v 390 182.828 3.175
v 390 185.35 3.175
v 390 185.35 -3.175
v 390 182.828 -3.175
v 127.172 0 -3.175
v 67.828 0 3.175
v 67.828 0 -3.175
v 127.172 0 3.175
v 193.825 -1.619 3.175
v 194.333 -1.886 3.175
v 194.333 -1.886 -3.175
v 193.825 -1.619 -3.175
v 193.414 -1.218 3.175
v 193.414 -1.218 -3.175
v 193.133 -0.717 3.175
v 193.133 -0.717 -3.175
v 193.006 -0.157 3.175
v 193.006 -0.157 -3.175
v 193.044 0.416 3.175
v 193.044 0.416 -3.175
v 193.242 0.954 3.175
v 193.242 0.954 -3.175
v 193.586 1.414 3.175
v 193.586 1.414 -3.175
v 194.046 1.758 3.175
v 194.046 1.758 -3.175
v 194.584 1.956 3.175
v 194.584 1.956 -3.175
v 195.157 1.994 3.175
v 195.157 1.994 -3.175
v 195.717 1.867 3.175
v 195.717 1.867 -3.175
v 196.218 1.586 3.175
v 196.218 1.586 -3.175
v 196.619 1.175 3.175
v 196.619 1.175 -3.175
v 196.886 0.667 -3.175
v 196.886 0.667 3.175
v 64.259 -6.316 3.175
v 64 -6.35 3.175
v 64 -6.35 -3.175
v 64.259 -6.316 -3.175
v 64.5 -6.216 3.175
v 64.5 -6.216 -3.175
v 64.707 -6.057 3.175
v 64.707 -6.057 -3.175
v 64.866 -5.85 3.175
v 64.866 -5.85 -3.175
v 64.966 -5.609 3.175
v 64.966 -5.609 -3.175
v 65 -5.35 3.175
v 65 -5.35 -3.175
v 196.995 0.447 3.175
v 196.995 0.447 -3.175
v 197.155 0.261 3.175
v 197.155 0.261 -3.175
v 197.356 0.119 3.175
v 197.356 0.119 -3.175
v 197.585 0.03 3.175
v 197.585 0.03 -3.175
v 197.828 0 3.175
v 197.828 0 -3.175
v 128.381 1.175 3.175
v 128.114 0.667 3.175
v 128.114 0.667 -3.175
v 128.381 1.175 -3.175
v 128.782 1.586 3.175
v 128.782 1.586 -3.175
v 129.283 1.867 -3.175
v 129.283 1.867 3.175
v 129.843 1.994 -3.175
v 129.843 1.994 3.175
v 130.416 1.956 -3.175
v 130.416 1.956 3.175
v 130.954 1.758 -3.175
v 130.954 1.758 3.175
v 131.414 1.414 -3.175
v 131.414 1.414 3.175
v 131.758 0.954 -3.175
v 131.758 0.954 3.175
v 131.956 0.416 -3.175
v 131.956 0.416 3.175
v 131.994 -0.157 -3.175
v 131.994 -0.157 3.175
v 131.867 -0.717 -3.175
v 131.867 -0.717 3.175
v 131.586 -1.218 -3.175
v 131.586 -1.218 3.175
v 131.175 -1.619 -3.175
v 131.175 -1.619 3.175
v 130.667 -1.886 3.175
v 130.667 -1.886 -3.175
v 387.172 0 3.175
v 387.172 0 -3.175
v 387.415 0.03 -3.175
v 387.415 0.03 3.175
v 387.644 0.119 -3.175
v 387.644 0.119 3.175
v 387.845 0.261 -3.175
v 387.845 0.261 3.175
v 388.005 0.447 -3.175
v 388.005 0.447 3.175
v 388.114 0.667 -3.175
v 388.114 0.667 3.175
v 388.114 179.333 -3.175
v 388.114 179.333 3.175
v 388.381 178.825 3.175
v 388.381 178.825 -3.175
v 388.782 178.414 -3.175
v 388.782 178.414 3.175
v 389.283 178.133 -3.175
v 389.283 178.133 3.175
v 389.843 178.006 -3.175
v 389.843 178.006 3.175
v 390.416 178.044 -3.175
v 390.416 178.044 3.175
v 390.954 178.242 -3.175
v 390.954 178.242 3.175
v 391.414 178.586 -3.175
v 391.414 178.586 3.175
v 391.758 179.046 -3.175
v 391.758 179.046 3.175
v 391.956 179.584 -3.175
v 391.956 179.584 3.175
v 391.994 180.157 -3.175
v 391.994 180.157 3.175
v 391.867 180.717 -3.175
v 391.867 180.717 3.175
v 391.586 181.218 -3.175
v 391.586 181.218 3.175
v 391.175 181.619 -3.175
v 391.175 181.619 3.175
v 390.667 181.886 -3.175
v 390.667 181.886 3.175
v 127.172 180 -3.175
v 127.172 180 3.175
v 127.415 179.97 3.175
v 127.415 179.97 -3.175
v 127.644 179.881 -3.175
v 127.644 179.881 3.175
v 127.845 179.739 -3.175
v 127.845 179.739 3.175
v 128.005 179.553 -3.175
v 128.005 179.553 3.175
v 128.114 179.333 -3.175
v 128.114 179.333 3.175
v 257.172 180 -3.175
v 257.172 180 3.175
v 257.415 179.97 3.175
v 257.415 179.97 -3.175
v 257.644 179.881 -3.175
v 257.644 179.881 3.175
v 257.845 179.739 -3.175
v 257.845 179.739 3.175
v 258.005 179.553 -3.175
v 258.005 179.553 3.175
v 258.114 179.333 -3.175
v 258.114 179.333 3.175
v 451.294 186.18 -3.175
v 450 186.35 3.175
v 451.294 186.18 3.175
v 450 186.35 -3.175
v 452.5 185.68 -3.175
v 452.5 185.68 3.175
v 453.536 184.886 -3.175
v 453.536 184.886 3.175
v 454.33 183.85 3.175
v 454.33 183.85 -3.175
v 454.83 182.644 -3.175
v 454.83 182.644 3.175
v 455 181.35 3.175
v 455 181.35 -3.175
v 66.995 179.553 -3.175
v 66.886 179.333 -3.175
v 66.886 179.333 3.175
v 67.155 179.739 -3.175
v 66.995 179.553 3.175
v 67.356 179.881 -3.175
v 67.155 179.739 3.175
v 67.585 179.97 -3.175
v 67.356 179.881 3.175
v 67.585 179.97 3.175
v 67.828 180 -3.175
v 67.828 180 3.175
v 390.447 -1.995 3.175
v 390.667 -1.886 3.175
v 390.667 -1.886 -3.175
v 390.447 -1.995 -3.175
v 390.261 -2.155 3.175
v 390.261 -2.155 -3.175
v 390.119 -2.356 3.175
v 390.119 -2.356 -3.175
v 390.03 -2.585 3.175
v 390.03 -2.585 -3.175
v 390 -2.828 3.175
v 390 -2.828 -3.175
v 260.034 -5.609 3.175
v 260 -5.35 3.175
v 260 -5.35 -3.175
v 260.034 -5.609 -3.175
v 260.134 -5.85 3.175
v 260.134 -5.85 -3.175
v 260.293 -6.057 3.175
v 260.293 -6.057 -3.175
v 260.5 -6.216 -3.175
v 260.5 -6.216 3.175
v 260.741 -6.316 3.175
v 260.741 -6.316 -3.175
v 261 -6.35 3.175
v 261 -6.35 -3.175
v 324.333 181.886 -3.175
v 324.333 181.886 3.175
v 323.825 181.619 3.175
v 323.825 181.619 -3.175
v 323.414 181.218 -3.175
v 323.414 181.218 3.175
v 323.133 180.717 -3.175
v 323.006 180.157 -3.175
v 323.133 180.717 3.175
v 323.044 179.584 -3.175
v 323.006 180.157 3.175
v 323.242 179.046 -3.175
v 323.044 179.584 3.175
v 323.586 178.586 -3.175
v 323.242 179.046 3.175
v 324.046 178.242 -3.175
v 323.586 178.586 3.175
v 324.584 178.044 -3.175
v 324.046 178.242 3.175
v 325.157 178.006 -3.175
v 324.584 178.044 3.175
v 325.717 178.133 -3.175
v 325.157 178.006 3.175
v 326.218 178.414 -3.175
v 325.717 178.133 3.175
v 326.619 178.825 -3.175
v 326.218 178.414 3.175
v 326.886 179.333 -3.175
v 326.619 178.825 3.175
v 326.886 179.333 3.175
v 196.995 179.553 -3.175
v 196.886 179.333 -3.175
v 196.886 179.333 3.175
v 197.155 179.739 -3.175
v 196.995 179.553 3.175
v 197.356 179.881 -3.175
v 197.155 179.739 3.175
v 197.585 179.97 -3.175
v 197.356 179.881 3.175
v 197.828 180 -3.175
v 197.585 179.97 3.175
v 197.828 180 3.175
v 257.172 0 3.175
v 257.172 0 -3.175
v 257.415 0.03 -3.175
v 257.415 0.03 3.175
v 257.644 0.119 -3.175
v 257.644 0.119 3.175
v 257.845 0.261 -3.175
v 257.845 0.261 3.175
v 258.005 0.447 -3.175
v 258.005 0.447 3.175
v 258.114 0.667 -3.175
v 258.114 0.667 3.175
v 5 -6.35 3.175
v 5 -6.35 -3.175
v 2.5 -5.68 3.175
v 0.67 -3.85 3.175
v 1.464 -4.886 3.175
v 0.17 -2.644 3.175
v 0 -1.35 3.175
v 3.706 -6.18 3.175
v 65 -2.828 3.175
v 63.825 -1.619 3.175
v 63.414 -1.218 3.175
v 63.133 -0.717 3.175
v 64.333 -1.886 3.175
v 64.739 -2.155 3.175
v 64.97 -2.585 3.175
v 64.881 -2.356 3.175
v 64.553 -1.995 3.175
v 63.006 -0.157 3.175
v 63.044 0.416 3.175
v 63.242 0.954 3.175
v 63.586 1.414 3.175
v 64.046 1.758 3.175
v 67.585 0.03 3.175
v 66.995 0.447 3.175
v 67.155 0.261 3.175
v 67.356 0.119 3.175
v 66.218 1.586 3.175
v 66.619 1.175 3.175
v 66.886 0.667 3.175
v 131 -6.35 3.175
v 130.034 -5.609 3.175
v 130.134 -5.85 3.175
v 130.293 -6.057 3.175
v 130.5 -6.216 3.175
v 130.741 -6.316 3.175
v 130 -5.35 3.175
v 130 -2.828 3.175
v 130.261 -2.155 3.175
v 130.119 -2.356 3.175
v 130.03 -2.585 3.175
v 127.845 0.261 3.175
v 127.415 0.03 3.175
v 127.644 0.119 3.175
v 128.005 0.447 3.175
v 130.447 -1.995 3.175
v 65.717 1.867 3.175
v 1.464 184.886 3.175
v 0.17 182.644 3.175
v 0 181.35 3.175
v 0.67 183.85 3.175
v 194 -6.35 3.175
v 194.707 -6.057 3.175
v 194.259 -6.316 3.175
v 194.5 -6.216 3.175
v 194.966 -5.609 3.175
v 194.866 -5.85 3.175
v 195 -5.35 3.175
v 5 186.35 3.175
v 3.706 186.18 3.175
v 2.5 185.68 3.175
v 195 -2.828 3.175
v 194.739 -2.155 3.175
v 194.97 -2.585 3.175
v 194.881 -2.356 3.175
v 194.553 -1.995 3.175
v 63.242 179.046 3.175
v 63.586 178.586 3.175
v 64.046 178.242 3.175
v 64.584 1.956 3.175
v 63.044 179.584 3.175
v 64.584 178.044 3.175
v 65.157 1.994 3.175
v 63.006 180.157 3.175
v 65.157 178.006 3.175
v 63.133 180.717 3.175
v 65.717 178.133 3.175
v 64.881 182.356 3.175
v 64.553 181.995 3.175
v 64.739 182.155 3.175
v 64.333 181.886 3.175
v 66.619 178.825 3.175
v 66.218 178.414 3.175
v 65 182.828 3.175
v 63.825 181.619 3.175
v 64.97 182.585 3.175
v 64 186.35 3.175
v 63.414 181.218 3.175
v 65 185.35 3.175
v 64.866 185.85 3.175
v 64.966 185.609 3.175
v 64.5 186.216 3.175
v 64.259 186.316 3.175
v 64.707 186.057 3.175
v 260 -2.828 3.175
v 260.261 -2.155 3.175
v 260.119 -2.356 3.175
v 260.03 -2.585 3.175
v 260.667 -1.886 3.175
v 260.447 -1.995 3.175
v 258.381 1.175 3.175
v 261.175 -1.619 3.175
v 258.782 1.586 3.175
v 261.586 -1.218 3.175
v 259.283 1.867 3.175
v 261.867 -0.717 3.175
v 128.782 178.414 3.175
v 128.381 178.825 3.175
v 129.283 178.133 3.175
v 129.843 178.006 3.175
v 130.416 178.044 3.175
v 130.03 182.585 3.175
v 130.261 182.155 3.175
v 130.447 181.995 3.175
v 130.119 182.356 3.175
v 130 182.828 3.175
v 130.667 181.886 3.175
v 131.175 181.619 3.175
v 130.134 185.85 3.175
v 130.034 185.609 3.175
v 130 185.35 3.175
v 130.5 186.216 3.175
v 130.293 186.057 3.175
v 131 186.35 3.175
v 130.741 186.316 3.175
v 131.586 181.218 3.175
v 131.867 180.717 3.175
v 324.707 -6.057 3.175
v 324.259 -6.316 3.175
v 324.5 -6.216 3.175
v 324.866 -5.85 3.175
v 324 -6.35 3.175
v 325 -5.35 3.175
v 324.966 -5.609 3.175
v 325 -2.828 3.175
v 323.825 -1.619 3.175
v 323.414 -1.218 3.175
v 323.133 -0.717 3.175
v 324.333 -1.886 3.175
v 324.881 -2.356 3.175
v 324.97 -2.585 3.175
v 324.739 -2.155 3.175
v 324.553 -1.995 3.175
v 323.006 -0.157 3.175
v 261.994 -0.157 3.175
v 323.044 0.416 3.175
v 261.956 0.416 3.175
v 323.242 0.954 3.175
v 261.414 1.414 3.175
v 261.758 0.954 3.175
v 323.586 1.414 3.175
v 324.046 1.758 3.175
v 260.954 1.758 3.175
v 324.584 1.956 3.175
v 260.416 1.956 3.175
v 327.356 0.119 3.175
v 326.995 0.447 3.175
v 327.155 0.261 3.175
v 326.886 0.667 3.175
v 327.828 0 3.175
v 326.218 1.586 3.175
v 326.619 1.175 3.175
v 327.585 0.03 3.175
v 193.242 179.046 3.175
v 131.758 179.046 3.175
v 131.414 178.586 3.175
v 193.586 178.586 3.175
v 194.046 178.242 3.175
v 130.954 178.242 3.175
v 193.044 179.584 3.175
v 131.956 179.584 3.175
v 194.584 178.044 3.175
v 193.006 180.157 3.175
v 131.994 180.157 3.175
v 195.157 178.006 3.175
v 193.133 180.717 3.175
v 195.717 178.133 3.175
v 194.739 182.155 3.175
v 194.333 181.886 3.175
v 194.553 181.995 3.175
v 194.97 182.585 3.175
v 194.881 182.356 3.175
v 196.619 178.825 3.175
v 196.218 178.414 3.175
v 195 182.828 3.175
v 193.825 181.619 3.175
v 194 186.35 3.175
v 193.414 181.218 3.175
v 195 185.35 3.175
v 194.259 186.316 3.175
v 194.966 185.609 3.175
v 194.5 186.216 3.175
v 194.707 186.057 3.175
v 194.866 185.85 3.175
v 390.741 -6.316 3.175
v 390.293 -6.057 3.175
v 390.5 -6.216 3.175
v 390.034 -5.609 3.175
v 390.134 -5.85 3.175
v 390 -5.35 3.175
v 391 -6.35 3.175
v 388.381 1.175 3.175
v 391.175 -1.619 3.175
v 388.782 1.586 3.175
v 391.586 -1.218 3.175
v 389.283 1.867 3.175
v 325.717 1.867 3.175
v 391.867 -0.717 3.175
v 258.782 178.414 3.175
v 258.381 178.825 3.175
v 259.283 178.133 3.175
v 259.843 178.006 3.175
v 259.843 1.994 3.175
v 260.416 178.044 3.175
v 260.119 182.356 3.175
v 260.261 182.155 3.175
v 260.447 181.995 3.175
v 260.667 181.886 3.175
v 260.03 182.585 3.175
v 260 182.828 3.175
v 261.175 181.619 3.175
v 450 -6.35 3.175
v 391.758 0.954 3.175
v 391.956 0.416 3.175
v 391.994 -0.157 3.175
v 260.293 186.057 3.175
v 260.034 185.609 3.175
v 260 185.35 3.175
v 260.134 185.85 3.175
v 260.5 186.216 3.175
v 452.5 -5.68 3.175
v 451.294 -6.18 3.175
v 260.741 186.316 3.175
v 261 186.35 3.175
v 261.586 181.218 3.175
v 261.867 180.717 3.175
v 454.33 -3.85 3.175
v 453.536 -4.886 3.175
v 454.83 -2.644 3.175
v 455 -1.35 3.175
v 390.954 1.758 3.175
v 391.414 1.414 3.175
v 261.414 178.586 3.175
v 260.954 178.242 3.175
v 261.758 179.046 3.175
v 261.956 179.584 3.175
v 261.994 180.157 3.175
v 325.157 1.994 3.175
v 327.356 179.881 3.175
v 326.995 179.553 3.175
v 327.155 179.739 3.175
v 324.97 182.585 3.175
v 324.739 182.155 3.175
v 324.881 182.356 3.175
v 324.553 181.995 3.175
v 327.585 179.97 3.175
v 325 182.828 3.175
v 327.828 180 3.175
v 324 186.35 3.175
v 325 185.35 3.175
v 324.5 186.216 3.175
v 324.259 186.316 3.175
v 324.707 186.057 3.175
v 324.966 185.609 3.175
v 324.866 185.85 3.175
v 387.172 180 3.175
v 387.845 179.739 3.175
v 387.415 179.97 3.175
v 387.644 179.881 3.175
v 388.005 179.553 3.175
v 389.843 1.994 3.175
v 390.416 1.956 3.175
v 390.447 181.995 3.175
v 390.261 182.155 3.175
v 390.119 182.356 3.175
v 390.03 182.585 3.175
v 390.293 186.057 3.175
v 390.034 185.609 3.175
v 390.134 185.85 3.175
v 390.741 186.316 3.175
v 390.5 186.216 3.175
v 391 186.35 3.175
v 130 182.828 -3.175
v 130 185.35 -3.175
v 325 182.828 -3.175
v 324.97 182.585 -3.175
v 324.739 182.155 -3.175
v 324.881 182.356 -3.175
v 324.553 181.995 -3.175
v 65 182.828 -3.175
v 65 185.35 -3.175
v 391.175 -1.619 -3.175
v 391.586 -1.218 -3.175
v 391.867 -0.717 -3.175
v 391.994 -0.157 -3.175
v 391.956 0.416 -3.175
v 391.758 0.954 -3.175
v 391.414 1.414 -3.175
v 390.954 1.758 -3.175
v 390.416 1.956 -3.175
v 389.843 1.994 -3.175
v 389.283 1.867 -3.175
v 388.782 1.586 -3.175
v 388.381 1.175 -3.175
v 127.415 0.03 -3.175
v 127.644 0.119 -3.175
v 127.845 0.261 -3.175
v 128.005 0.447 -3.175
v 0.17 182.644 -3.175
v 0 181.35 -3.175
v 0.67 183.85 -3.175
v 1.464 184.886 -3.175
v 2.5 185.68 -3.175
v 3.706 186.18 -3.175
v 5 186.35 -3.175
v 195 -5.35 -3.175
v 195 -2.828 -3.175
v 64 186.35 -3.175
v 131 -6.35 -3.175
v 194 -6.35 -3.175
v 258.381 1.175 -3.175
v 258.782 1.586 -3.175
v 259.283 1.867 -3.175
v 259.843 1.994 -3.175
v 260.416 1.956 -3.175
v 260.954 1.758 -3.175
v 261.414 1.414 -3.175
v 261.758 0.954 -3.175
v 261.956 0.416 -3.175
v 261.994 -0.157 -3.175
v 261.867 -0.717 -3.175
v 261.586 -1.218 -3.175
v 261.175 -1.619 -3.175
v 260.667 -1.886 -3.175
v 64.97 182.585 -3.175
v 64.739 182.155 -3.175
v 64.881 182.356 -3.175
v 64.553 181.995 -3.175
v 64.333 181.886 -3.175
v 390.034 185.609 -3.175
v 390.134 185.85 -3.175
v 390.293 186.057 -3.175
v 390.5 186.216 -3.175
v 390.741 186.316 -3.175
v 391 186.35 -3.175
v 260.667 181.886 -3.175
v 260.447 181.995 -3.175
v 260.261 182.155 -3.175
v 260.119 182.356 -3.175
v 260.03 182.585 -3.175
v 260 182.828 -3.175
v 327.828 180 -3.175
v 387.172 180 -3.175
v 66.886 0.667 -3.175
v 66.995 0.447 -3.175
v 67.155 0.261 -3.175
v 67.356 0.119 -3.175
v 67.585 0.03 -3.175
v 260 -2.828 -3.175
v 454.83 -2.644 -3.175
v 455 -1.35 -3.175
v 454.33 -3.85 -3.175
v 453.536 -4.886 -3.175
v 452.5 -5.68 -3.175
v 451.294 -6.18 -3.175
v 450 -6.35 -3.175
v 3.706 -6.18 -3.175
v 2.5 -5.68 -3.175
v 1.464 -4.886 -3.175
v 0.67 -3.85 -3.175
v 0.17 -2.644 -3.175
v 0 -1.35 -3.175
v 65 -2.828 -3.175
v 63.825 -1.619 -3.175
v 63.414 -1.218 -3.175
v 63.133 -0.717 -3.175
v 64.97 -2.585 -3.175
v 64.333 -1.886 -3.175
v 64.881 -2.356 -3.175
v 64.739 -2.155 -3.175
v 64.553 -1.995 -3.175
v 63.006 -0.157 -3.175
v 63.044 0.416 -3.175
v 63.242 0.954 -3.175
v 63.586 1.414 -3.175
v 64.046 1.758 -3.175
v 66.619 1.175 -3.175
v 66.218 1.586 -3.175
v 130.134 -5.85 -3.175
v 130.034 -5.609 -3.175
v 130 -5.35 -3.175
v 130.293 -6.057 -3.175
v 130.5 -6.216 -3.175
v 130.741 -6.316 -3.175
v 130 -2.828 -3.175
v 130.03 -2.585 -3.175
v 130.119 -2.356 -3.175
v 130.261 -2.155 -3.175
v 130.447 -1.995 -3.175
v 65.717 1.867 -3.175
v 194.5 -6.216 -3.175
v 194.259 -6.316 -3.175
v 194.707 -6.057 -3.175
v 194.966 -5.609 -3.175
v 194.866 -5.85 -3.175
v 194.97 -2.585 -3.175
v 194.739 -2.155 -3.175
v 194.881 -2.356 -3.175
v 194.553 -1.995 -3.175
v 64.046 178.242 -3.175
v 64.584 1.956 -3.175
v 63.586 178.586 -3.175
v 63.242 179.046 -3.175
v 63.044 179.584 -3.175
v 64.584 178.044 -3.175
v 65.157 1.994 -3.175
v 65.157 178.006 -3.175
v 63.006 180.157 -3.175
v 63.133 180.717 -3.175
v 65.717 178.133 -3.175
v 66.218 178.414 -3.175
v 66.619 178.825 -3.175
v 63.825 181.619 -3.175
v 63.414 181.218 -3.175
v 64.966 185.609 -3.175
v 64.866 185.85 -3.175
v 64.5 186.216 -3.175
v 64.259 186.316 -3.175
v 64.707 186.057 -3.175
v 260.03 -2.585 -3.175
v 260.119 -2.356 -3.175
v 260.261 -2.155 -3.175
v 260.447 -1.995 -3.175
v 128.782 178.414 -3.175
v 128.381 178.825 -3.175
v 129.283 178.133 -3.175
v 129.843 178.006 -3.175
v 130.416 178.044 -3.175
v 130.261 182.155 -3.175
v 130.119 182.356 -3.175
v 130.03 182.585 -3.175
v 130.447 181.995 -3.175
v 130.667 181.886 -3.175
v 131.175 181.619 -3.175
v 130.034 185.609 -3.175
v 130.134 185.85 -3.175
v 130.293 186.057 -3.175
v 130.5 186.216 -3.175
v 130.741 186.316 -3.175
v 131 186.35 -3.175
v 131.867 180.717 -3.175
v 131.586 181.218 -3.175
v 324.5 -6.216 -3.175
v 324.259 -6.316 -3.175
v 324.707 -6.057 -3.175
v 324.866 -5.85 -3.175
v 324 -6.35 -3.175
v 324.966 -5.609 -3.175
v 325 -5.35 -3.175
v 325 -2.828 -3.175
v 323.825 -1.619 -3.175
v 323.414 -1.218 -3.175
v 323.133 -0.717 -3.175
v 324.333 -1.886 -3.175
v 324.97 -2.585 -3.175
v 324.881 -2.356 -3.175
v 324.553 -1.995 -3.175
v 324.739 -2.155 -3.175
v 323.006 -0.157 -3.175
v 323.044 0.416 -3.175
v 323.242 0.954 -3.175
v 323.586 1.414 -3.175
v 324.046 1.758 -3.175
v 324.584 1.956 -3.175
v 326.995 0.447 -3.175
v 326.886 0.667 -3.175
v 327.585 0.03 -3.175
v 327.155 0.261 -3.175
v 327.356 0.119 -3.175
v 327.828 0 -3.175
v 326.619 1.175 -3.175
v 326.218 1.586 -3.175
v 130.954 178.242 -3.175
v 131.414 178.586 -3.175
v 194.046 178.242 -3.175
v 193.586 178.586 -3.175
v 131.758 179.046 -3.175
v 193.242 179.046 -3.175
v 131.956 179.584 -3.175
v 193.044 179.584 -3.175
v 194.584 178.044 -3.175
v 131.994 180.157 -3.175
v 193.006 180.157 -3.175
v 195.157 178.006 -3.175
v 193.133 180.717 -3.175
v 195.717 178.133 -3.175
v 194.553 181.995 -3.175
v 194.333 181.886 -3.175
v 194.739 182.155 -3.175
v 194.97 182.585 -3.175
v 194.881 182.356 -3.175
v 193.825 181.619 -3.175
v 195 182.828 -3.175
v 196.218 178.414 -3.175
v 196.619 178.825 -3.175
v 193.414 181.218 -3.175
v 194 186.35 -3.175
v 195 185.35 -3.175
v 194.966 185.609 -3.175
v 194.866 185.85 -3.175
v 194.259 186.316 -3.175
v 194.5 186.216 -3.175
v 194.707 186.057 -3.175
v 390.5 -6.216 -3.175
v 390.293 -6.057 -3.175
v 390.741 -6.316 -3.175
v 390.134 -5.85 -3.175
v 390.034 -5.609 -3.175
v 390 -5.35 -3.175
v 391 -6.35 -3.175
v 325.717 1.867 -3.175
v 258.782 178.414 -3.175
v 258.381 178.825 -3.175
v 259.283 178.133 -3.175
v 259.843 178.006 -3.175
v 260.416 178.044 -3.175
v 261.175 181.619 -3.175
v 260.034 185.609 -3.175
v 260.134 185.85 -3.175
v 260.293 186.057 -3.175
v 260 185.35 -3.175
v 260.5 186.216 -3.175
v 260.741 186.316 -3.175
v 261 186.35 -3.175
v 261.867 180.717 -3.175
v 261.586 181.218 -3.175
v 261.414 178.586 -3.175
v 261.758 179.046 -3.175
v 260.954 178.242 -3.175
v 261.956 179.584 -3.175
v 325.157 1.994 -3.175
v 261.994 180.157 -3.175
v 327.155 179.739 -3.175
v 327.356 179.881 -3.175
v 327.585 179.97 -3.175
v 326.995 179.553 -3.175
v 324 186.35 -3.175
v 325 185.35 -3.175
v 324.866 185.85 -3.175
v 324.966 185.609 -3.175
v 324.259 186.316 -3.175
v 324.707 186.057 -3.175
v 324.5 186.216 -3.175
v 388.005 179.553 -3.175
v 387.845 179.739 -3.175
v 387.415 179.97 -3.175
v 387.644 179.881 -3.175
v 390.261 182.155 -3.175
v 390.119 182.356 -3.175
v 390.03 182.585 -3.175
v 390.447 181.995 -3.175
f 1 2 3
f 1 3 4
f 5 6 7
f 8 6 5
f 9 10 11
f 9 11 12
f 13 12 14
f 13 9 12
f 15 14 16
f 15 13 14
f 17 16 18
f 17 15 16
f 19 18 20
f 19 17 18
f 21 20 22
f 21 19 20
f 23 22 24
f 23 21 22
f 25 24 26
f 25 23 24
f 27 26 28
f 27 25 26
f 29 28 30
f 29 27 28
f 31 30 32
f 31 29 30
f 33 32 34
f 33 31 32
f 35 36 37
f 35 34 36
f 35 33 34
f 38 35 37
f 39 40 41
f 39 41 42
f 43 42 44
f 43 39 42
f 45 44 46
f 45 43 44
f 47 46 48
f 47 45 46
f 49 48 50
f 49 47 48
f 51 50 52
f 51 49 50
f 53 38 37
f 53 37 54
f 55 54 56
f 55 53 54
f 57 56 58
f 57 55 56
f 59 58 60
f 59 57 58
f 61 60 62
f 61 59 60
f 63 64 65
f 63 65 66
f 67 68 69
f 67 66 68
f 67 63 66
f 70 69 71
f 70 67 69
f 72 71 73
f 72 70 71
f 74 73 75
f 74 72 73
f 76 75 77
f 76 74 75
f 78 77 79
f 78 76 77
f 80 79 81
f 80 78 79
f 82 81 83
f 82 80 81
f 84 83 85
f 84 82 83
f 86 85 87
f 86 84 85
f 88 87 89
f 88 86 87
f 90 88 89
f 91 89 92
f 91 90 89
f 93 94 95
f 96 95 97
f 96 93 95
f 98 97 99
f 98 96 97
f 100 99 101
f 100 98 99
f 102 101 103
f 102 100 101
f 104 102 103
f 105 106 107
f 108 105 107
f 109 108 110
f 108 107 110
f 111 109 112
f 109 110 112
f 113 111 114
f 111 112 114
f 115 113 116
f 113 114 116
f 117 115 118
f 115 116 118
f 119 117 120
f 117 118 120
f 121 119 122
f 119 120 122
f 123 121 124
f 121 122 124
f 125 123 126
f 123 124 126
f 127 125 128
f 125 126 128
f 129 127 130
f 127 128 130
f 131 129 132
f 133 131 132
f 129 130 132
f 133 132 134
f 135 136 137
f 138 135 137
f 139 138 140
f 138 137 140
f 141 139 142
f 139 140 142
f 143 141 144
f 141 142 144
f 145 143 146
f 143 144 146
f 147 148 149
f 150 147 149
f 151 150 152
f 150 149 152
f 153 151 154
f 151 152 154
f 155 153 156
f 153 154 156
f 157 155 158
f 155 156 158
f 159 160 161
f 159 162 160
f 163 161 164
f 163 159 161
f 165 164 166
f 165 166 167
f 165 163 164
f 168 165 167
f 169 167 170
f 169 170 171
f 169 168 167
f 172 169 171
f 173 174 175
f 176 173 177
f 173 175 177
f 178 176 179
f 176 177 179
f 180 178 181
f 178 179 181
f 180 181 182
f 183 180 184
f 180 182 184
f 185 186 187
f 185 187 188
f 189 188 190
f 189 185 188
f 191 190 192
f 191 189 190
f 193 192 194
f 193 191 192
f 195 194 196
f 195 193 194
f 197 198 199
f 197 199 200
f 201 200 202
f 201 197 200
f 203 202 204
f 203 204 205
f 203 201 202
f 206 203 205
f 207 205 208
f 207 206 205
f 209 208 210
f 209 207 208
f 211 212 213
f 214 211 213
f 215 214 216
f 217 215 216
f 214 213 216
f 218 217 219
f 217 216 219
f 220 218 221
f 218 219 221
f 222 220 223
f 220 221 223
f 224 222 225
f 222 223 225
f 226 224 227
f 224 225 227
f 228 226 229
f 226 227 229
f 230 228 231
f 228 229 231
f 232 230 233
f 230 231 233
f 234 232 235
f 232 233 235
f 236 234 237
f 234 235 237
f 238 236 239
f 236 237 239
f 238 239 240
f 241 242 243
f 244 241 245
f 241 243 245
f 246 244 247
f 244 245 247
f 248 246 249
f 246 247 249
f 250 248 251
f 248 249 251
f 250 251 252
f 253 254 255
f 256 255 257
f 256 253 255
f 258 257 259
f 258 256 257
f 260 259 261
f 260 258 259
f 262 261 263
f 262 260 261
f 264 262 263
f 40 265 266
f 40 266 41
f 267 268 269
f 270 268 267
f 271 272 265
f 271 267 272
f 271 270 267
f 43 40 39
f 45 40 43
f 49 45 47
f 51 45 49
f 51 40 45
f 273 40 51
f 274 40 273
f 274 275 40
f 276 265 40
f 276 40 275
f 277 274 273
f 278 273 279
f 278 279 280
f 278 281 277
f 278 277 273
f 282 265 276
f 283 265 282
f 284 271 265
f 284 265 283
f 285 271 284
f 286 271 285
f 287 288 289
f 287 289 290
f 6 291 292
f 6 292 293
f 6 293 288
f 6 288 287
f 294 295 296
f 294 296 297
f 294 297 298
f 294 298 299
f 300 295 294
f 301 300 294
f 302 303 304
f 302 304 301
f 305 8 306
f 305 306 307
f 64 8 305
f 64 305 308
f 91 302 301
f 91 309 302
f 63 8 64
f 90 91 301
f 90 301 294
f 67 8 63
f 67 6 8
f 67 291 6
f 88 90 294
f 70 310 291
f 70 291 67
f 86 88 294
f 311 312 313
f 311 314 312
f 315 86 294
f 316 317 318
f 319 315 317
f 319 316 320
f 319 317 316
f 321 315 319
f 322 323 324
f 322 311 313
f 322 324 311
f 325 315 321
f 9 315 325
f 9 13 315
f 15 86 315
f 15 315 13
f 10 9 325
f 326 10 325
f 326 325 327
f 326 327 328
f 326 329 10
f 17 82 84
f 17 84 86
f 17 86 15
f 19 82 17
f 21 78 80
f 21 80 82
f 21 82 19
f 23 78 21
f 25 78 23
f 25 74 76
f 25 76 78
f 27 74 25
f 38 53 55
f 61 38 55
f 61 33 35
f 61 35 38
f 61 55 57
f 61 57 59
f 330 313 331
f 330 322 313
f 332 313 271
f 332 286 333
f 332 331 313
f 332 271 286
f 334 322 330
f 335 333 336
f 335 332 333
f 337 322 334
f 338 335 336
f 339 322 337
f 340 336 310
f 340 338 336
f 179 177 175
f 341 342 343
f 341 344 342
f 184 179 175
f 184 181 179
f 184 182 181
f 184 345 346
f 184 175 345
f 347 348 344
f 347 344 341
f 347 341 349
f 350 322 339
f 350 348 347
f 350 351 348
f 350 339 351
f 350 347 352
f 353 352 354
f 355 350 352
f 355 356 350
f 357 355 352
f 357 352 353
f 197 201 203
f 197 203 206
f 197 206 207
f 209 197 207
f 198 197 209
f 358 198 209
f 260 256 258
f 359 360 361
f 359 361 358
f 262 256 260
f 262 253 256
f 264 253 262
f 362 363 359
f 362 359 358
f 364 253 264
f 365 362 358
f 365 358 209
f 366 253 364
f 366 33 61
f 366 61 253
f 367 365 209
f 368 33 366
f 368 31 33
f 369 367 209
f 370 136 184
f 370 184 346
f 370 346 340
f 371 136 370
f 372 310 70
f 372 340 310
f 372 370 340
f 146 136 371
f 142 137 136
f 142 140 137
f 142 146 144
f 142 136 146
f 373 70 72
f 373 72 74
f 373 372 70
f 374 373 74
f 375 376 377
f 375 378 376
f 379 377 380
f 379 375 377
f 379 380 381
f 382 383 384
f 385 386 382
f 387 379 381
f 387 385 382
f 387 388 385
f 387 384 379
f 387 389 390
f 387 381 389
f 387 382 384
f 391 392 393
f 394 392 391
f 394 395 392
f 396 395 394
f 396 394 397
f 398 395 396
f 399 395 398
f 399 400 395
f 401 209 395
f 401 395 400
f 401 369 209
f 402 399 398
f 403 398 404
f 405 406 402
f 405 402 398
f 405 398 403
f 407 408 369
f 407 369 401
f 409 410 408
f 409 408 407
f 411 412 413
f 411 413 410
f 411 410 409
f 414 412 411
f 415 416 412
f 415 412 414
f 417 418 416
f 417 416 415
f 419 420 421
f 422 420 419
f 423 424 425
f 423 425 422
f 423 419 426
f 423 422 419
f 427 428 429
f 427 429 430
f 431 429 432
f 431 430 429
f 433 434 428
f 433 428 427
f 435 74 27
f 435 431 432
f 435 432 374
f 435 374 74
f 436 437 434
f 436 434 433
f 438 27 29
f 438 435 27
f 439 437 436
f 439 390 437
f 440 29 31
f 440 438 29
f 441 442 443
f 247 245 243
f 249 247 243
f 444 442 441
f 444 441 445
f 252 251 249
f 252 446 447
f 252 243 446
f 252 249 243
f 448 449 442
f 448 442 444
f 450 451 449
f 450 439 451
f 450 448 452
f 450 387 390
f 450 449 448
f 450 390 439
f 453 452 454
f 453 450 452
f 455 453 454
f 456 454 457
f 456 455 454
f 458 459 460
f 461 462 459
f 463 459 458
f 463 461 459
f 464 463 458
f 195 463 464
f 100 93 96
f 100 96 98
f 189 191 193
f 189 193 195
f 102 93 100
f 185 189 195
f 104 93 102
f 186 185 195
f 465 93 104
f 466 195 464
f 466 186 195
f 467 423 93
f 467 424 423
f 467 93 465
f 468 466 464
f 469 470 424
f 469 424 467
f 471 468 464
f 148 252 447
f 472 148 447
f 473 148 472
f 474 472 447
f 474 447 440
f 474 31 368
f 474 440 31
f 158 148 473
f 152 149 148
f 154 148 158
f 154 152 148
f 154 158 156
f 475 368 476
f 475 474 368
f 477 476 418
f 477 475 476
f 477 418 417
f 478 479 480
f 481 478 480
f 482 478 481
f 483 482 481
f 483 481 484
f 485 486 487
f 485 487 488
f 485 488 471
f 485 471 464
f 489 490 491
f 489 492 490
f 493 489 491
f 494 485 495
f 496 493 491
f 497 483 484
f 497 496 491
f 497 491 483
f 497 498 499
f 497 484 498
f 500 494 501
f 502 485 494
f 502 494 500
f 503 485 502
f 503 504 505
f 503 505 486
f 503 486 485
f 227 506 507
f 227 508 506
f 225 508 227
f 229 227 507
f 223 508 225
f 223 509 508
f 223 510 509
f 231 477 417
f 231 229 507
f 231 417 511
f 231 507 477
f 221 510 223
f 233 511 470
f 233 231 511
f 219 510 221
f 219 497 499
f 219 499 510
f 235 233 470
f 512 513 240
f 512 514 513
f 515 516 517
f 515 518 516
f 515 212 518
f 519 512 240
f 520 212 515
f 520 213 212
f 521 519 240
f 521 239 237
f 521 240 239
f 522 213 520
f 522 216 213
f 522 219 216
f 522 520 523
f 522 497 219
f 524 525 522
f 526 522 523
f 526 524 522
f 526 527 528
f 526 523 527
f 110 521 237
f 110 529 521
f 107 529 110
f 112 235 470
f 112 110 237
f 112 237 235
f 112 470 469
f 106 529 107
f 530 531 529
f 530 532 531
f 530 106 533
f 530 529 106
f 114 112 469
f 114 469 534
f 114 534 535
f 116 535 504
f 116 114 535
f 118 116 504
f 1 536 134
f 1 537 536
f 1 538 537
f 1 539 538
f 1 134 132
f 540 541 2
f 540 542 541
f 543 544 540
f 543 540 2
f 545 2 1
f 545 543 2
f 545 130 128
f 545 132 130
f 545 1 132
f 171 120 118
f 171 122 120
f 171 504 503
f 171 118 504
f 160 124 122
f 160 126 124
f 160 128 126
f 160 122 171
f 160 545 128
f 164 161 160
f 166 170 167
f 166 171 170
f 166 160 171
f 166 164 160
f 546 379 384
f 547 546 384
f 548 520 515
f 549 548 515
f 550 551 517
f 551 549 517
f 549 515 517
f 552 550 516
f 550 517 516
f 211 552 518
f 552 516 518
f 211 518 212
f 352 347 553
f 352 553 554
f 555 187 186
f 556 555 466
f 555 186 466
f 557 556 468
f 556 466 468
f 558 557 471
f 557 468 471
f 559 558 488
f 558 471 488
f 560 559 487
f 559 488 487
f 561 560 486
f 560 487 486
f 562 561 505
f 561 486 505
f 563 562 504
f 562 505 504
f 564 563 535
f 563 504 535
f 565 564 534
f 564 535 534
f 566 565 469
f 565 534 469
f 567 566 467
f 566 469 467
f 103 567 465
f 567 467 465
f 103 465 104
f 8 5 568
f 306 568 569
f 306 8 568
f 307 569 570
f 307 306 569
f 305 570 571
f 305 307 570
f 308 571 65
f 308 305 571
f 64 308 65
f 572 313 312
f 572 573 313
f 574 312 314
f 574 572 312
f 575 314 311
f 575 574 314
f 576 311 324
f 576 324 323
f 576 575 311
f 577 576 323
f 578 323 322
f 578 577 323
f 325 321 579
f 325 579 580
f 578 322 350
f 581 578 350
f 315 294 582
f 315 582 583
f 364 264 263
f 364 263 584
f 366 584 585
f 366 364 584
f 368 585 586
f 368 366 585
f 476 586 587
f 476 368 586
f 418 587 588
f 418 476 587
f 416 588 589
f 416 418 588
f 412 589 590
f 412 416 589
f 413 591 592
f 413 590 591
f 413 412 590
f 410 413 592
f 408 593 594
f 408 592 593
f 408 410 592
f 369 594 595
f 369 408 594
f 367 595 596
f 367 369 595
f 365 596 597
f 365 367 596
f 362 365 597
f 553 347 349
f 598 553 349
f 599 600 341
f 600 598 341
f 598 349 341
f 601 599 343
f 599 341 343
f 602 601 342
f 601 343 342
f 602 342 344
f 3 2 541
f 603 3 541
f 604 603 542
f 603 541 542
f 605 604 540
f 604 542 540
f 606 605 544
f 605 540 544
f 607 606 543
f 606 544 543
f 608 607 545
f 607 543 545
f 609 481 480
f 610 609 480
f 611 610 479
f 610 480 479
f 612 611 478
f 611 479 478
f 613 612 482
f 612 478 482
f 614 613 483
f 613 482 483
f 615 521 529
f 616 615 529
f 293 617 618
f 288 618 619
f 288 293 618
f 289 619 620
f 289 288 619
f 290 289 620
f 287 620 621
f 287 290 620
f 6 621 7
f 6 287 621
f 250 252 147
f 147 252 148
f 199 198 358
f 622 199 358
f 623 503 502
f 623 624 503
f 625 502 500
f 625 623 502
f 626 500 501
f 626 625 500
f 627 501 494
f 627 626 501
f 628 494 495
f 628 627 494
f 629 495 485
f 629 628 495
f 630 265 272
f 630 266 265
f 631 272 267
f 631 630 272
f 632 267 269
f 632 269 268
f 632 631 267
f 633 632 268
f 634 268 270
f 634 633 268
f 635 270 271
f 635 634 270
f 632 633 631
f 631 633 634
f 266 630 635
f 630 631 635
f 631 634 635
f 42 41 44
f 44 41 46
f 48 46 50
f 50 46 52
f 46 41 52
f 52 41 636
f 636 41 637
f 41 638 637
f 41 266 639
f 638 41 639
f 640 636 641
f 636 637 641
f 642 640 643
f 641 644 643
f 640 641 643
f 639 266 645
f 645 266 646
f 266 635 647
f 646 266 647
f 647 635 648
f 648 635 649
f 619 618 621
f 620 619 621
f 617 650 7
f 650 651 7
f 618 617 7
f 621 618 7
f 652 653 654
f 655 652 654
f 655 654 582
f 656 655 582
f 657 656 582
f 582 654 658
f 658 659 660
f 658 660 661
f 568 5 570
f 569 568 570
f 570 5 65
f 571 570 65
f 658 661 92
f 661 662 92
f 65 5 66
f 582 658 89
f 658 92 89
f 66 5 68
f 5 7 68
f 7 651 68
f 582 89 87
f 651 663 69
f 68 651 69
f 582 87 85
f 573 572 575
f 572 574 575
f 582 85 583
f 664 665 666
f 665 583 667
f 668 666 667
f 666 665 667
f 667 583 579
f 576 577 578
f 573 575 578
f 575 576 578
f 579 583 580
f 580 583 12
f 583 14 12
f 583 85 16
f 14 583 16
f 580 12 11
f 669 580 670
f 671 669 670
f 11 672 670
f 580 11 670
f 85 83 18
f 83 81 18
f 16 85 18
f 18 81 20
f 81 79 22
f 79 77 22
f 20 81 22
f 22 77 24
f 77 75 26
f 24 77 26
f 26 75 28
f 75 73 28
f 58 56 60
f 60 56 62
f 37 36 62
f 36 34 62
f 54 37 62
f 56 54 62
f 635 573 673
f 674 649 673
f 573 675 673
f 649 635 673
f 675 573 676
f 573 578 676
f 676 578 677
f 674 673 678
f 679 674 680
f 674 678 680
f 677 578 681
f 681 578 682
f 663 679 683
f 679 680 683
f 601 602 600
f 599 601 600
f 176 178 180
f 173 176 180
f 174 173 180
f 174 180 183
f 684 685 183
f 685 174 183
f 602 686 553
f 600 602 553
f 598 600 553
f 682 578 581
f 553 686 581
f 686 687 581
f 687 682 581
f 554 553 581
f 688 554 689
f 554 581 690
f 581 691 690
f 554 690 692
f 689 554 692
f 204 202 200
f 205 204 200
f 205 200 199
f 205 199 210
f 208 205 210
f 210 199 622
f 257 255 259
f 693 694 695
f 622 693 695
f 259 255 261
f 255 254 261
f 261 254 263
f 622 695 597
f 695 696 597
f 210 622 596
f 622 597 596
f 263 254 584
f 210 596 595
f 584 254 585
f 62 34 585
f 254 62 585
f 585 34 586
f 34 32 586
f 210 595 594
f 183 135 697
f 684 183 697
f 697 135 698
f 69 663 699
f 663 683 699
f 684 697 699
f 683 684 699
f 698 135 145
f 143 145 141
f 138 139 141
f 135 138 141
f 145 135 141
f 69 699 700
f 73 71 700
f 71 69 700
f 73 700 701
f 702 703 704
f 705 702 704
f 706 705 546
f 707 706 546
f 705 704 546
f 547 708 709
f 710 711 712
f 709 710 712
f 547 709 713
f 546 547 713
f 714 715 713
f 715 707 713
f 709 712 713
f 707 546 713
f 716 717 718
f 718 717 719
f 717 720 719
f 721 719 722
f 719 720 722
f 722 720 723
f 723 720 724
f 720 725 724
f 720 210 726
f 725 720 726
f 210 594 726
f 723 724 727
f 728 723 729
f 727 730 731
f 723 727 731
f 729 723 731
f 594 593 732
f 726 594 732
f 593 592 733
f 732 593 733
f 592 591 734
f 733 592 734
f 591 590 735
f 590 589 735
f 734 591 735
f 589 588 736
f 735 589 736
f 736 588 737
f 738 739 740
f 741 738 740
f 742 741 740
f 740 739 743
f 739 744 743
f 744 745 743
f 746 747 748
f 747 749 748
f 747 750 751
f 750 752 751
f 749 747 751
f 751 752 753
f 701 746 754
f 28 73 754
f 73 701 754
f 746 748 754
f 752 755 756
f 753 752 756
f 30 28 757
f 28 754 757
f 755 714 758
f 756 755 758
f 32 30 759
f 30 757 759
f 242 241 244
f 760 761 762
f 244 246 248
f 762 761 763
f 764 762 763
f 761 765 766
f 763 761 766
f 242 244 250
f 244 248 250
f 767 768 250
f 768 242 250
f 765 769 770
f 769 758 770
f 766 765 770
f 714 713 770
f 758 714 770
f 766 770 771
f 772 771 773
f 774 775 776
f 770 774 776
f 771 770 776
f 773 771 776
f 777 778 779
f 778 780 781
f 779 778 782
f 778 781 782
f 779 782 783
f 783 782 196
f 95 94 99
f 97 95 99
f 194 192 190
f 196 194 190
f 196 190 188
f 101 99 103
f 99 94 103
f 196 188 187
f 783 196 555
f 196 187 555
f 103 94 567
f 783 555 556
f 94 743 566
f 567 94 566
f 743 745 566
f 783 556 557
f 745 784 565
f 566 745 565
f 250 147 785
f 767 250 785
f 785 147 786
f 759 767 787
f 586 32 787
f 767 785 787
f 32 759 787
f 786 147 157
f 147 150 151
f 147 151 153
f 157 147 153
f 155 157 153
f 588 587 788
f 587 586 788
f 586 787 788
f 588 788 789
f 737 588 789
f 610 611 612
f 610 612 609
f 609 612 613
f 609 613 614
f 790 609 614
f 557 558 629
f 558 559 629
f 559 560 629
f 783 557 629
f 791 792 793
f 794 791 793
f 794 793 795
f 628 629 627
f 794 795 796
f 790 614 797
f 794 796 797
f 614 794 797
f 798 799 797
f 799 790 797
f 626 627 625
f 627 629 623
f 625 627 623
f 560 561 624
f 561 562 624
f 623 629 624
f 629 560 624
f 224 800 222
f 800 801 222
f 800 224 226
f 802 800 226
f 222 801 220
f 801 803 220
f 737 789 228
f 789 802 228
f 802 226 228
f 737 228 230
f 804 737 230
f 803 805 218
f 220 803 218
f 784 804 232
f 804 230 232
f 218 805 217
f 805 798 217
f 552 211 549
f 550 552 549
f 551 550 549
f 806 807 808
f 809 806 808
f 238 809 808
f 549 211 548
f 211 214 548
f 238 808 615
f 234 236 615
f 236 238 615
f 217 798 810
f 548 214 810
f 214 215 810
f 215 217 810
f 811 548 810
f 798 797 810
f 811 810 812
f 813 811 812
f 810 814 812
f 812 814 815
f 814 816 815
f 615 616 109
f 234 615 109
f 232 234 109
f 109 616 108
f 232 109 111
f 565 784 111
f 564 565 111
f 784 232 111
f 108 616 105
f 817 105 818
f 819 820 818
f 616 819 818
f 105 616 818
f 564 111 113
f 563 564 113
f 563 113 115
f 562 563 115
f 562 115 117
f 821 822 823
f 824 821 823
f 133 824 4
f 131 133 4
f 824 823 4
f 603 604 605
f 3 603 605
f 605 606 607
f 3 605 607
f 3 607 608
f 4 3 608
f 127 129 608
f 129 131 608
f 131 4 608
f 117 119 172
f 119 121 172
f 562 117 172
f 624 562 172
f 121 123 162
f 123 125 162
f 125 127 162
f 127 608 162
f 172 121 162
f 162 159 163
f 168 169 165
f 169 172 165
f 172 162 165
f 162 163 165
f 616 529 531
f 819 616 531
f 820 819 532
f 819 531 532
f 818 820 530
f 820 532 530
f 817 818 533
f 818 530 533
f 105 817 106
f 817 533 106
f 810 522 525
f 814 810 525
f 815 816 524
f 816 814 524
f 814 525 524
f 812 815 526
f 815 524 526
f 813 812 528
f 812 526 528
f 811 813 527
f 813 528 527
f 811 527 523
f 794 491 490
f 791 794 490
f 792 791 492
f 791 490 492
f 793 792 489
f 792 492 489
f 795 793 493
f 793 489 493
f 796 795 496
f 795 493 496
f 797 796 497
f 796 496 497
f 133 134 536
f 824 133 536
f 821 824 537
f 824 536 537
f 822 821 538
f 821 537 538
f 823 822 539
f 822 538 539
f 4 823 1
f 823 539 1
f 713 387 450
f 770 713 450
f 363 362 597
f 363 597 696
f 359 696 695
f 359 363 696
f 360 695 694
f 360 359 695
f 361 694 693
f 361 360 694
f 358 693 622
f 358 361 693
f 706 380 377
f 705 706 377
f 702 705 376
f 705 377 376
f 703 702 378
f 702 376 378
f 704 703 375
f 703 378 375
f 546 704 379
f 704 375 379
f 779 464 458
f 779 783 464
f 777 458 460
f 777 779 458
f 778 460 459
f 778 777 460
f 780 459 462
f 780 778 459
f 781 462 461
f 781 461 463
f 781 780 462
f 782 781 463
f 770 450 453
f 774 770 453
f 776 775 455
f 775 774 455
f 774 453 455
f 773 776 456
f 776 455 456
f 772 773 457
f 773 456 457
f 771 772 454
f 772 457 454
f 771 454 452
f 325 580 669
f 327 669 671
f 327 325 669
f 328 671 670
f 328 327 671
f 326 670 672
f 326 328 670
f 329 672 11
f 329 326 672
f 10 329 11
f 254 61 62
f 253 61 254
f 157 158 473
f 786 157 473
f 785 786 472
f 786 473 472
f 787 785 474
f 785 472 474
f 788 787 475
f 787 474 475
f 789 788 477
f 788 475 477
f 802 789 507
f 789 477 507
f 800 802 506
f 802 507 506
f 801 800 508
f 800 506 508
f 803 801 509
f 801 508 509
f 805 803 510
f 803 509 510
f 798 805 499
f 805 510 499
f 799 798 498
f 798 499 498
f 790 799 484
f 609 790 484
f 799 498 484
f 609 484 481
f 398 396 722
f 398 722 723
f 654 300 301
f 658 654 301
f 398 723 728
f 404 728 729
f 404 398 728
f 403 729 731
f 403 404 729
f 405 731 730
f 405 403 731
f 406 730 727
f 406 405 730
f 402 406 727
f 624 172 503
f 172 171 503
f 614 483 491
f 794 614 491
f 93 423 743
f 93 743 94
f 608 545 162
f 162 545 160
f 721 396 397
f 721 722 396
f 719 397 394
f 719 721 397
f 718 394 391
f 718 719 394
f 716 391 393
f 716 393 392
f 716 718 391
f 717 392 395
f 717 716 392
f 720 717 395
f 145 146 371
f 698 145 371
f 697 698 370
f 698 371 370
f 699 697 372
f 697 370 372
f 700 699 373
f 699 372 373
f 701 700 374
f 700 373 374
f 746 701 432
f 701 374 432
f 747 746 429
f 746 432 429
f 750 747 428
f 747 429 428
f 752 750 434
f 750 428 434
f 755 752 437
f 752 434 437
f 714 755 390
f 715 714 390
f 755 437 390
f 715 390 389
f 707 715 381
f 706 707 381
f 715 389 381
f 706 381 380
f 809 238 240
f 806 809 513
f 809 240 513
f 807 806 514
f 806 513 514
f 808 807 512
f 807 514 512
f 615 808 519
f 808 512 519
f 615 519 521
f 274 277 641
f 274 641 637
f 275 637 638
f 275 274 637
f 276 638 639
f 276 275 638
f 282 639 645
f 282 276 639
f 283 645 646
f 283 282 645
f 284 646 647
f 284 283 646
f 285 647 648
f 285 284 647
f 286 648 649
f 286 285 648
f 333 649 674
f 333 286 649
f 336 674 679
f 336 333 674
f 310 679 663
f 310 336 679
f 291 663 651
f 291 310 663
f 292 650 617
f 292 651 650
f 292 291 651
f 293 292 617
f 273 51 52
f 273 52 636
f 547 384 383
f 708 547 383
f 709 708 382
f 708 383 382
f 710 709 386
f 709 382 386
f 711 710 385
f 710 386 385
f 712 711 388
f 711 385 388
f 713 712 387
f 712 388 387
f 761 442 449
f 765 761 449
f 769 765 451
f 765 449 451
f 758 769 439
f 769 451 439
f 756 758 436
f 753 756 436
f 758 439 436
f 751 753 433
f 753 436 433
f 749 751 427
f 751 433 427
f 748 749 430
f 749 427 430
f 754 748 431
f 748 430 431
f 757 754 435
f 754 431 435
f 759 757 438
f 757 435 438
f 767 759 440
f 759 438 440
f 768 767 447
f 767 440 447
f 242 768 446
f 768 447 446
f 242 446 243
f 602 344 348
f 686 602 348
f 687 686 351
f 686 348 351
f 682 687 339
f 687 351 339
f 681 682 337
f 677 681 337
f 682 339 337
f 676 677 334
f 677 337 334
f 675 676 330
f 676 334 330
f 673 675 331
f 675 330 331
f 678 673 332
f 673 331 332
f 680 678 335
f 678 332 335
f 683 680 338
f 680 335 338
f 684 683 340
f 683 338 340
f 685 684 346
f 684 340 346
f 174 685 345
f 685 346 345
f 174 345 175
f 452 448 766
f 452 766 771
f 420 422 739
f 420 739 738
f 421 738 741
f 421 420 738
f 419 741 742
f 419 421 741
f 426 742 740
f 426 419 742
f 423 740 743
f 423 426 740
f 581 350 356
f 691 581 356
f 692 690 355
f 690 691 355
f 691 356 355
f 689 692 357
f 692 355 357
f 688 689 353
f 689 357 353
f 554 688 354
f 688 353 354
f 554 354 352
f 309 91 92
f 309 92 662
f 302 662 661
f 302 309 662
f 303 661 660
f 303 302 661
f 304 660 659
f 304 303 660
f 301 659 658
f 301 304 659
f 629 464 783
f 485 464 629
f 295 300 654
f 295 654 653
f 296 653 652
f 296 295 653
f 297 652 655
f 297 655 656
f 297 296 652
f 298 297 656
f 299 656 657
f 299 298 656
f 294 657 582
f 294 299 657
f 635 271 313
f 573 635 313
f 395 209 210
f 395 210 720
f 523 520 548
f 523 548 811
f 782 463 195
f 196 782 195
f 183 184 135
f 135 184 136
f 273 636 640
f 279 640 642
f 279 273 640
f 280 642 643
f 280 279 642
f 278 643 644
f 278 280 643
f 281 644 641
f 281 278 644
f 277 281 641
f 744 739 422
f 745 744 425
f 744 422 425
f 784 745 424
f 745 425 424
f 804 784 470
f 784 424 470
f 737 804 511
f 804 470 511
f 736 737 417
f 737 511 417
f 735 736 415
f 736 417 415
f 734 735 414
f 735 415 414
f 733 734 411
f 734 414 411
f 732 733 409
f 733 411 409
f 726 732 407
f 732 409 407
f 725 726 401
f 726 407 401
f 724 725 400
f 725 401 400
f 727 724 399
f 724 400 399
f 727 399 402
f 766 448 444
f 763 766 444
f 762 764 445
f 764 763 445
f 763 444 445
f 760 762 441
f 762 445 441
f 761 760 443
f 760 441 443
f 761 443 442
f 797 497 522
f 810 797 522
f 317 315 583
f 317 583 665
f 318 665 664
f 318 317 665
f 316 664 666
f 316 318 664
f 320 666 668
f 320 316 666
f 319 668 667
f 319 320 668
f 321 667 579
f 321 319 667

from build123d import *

# Parameters (mm, degrees)
SKETCH1_W               = 455
SKETCH1_H               = 180
BOSS_EXTRUDE1_DEPTH     = 3.175
SKETCH2_W               = 65
SKETCH2_H               = 6.35
BOSS_EXTRUDE2_DEPTH     = 6.35
LPATTERN1_COUNT         = 4
LPATTERN1_PITCH         = 130
MIRROR1_COPY_1_SKETCH_W = 65
MIRROR1_COPY_1_SKETCH_H = 6.35
MIRROR1_COPY_1_DEPTH    = 6.35
MIRROR1_COPY_2_SKETCH_W = 65
MIRROR1_COPY_2_SKETCH_H = 6.35
MIRROR1_COPY_2_DEPTH    = 6.35
MIRROR1_COPY_3_SKETCH_W = 65
MIRROR1_COPY_3_SKETCH_H = 6.35
MIRROR1_COPY_3_DEPTH    = 6.35
SKETCH3_R               = 2
CUT_EXTRUDE1_DEPTH      = 7.35
FILLET2_R               = 1
CUT_EXTRUDE2_DEPTH      = 7.35
LPATTERN2_COUNT         = 3
LPATTERN2_PITCH         = 130
MIRROR2_COPY_1_DEPTH    = 7.35
MIRROR2_COPY_2_DEPTH    = 7.35
FILLET4_R               = 5


with BuildPart() as part:
    # Sketch1 → Boss-Extrude1 (new body, symmetric)
    with BuildSketch(Plane.XY):
        with Locations((227.5, 90)):
            Rectangle(SKETCH1_W, SKETCH1_H)
    extrude(amount=BOSS_EXTRUDE1_DEPTH, both=True)

    # Sketch2 → Boss-Extrude2 (add)
    with BuildSketch(Plane.XY.offset(3.175)):
        with Locations((422.5, -3.175)):
            Rectangle(SKETCH2_W, SKETCH2_H)
    boss_extrude2 = extrude(amount=-BOSS_EXTRUDE2_DEPTH)

    # LPattern1: Boss-Extrude2 ×4
    with Locations(*[(-i * LPATTERN1_PITCH, 0, 0) for i in range(1, LPATTERN1_COUNT)]):
        add(boss_extrude2)

    # Mirror1: Boss-Extrude2 across plane
    add(boss_extrude2.mirror(Plane(origin=(0, 90, 0), x_dir=(0, 0, 1), z_dir=(0, -1, 0))))

    # Mirror1 copy 1 sketch → Mirror1 copy 1 (add)
    with BuildSketch(Plane(origin=(-130, 180, 3.175), x_dir=(1, 0, 0), z_dir=(0, 0, 1))):
        with Locations((422.5, 3.175)):
            Rectangle(MIRROR1_COPY_1_SKETCH_W, MIRROR1_COPY_1_SKETCH_H)
    extrude(amount=-MIRROR1_COPY_1_DEPTH)

    # Mirror1 copy 2 sketch → Mirror1 copy 2 (add)
    with BuildSketch(Plane(origin=(-260, 180, 3.175), x_dir=(1, 0, 0), z_dir=(0, 0, 1))):
        with Locations((422.5, 3.175)):
            Rectangle(MIRROR1_COPY_2_SKETCH_W, MIRROR1_COPY_2_SKETCH_H)
    extrude(amount=-MIRROR1_COPY_2_DEPTH)

    # Mirror1 copy 3 sketch → Mirror1 copy 3 (add)
    with BuildSketch(Plane(origin=(-390, 180, 3.175), x_dir=(1, 0, 0), z_dir=(0, 0, 1))):
        with Locations((422.5, 3.175)):
            Rectangle(MIRROR1_COPY_3_SKETCH_W, MIRROR1_COPY_3_SKETCH_H)
    extrude(amount=-MIRROR1_COPY_3_DEPTH)

    # Sketch3 → Cut-Extrude1 (cut, through all)
    with BuildSketch(Plane.XY.offset(3.175)):
        with Locations((325, 0)):
            Circle(SKETCH3_R)
        with Locations((390, 0)):
            Circle(SKETCH3_R)
    extrude(amount=-CUT_EXTRUDE1_DEPTH, mode=Mode.SUBTRACT)

    # Fillet2
    fillet2_edges = [part.edges().sort_by_distance(p)[0] for p in [
        (390, -6.35, 0),
        (325, -6.35, 0),
    ]]
    fillet(fillet2_edges, radius=FILLET2_R)

    # Sketch4 → Cut-Extrude2 (cut, through all)
    with BuildSketch(Plane.XY.offset(3.175)):
        with BuildLine():
            Line((390, -2.828427125), (390, -5.35))
            ThreePointArc((390, -5.35), (390.292893219, -6.057106781), (391, -6.35))
            Line((391, -6.35), (324, -6.35))
            ThreePointArc((324, -6.35), (324.707106781, -6.057106781), (325, -5.35))
            Line((325, -5.35), (325, -2.828427125))
            ThreePointArc((325, -2.828427125), (324.816496581, -2.251076856), (324.333333333, -1.885618083))
            ThreePointArc((324.333333333, -1.885618083), (323.585786438, 1.414213562), (326.885618083, 0.666666667))
            ThreePointArc((326.885618083, 0.666666667), (327.251076856, 0.183503419), (327.828427125, 0))
            Line((327.828427125, 0), (387.171572875, 0))
            ThreePointArc((387.171572875, 0), (387.748923144, 0.183503419), (388.114381917, 0.666666667))
            ThreePointArc((388.114381917, 0.666666667), (391.414213562, 1.414213562), (390.666666667, -1.885618083))
            ThreePointArc((390.666666667, -1.885618083), (390.183503419, -2.251076856), (390, -2.828427125))
        make_face()
    cut_extrude2 = extrude(amount=-CUT_EXTRUDE2_DEPTH, mode=Mode.SUBTRACT)

    # LPattern2: Cut-Extrude2 ×3
    with Locations(*[(-i * LPATTERN2_PITCH, 0, 0) for i in range(1, LPATTERN2_COUNT)]):
        add(cut_extrude2, mode=Mode.SUBTRACT)

    # Mirror2: Cut-Extrude2 across plane
    add(cut_extrude2.mirror(Plane(origin=(0, 90, 0), x_dir=(0, 0, 1), z_dir=(0, -1, 0))), mode=Mode.SUBTRACT)

    # Mirror2 copy 1 sketch → Mirror2 copy 1 (cut, through all)
    with BuildSketch(Plane(origin=(-130, 180, 3.175), x_dir=(1, 0, 0), z_dir=(0, 0, 1))):
        with BuildLine():
            Line((390, 2.828427125), (390, 5.35))
            ThreePointArc((390, 5.35), (390.292893219, 6.057106781), (391, 6.35))
            Line((391, 6.35), (324, 6.35))
            ThreePointArc((324, 6.35), (324.707106781, 6.057106781), (325, 5.35))
            Line((325, 5.35), (325, 2.828427125))
            ThreePointArc((325, 2.828427125), (324.816496581, 2.251076856), (324.333333333, 1.885618083))
            ThreePointArc((324.333333333, 1.885618083), (323.585786438, -1.414213562), (326.885618083, -0.666666667))
            ThreePointArc((326.885618083, -0.666666667), (327.251076856, -0.183503419), (327.828427125, 0))
            Line((327.828427125, 0), (387.171572875, 0))
            ThreePointArc((387.171572875, 0), (387.748923144, -0.183503419), (388.114381917, -0.666666667))
            ThreePointArc((388.114381917, -0.666666667), (391.414213562, -1.414213562), (390.666666667, 1.885618083))
            ThreePointArc((390.666666667, 1.885618083), (390.183503419, 2.251076856), (390, 2.828427125))
        make_face()
    extrude(amount=-MIRROR2_COPY_1_DEPTH, mode=Mode.SUBTRACT)

    # Mirror2 copy 2 sketch → Mirror2 copy 2 (cut, through all)
    with BuildSketch(Plane(origin=(-260, 180, 3.175), x_dir=(1, 0, 0), z_dir=(0, 0, 1))):
        with BuildLine():
            Line((390, 2.828427125), (390, 5.35))
            ThreePointArc((390, 5.35), (390.292893219, 6.057106781), (391, 6.35))
            Line((391, 6.35), (324, 6.35))
            ThreePointArc((324, 6.35), (324.707106781, 6.057106781), (325, 5.35))
            Line((325, 5.35), (325, 2.828427125))
            ThreePointArc((325, 2.828427125), (324.816496581, 2.251076856), (324.333333333, 1.885618083))
            ThreePointArc((324.333333333, 1.885618083), (323.585786438, -1.414213562), (326.885618083, -0.666666667))
            ThreePointArc((326.885618083, -0.666666667), (327.251076856, -0.183503419), (327.828427125, 0))
            Line((327.828427125, 0), (387.171572875, 0))
            ThreePointArc((387.171572875, 0), (387.748923144, -0.183503419), (388.114381917, -0.666666667))
            ThreePointArc((388.114381917, -0.666666667), (391.414213562, -1.414213562), (390.666666667, 1.885618083))
            ThreePointArc((390.666666667, 1.885618083), (390.183503419, 2.251076856), (390, 2.828427125))
        make_face()
    extrude(amount=-MIRROR2_COPY_2_DEPTH, mode=Mode.SUBTRACT)

    # Fillet4
    fillet4_edges = [part.edges().sort_by_distance(p)[0] for p in [
        (455, -6.35, 0),
        (0, -6.35, 0),
        (455, 186.35, 0),
        (0, 186.35, 0),
    ]]
    fillet(fillet4_edges, radius=FILLET4_R)


solid = part.part
